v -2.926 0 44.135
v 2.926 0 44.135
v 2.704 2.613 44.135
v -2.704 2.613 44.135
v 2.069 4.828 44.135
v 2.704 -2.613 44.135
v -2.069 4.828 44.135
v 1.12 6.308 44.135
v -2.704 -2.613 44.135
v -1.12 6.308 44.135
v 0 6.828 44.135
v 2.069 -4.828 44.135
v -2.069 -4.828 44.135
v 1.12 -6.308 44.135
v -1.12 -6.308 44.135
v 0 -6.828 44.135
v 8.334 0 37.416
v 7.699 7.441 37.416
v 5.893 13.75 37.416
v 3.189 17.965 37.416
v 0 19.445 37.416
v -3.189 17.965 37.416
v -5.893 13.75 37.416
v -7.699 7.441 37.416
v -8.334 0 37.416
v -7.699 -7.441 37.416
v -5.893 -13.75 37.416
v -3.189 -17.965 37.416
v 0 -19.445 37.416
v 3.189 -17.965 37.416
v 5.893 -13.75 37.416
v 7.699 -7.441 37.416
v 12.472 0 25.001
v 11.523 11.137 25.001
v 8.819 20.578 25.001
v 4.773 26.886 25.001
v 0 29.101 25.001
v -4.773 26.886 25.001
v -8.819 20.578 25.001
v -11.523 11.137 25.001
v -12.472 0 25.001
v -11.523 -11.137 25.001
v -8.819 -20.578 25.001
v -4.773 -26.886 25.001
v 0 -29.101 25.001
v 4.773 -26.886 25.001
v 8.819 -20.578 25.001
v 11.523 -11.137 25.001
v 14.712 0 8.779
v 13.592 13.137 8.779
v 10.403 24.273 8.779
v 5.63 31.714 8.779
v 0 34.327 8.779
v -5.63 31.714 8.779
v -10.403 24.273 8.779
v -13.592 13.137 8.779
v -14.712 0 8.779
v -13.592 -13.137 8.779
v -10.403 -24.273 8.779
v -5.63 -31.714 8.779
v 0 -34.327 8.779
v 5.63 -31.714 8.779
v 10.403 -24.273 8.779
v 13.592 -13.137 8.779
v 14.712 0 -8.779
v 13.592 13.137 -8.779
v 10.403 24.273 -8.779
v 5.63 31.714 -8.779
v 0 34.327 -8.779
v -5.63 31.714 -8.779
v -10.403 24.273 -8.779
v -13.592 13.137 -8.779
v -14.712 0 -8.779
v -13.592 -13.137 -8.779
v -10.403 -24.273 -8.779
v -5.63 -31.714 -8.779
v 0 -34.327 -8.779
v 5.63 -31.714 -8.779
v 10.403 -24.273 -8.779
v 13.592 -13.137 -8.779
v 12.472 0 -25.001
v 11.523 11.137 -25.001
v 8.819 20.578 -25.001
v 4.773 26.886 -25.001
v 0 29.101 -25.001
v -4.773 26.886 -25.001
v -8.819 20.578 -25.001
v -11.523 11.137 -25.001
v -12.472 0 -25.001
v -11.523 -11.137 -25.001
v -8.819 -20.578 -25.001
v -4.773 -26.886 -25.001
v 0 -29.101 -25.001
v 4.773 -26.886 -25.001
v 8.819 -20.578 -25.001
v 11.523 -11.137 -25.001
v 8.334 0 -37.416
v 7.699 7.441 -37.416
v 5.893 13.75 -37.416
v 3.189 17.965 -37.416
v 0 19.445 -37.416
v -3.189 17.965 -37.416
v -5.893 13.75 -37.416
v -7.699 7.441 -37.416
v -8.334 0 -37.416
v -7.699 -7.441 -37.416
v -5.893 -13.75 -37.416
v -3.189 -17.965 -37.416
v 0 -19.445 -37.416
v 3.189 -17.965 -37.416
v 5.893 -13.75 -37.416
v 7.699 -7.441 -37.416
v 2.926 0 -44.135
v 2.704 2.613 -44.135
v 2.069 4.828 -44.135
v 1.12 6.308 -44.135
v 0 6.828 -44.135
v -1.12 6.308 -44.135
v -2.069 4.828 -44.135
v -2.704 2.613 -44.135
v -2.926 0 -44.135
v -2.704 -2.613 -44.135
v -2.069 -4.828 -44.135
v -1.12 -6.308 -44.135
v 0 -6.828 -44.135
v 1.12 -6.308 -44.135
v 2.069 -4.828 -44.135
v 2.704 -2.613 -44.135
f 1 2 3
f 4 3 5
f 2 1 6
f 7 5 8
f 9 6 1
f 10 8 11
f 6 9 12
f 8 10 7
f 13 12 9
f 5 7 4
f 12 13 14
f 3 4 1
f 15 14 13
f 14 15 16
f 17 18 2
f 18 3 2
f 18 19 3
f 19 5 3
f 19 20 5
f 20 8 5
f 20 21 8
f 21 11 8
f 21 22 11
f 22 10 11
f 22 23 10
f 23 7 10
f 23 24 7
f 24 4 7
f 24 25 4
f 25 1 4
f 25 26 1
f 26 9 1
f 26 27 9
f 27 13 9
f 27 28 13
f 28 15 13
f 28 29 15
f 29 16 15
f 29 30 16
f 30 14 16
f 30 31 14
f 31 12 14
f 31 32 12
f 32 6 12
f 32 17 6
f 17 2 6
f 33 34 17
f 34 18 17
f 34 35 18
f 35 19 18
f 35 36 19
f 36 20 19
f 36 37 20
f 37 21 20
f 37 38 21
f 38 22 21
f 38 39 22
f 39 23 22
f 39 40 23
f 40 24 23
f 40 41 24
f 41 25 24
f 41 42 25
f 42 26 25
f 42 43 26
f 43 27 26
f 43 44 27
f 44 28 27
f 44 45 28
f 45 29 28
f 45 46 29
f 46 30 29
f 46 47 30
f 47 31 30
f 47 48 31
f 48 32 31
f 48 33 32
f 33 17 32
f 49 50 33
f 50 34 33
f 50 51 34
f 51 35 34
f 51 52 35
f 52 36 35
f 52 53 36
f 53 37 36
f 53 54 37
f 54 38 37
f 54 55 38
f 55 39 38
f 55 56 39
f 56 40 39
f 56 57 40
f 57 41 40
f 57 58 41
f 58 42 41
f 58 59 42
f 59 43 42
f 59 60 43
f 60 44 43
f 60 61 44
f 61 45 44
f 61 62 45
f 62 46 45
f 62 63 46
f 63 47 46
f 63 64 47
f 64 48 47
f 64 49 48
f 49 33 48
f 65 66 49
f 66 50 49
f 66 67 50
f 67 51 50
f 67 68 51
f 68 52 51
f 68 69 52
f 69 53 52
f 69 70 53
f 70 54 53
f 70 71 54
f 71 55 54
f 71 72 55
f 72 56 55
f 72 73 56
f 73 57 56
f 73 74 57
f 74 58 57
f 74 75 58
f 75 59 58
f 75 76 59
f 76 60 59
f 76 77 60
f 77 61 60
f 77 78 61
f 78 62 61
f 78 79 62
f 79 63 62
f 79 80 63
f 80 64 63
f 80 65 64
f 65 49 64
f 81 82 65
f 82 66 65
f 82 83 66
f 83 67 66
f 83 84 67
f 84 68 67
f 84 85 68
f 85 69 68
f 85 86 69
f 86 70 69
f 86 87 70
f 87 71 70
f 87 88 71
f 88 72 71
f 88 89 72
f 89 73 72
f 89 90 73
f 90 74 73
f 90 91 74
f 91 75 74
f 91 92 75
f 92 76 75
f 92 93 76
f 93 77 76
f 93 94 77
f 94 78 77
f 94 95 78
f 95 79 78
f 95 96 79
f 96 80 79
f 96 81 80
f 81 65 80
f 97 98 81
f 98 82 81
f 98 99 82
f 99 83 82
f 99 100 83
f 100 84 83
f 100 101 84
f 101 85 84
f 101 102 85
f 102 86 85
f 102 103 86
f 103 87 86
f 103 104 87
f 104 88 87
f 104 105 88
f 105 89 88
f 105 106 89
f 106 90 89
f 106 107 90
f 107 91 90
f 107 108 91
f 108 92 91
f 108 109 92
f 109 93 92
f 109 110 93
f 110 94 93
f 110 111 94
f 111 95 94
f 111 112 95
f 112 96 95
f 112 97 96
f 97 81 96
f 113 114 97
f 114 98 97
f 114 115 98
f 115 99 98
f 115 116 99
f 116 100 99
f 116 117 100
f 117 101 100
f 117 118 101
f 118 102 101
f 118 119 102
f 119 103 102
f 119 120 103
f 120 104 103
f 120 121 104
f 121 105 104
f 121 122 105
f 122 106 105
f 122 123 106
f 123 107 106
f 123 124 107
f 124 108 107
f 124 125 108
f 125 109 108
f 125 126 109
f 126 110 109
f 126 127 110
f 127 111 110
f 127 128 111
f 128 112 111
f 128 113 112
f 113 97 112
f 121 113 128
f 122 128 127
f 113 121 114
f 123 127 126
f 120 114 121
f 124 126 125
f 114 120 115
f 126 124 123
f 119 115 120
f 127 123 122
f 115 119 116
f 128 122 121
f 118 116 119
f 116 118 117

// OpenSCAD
// Generated by SolidPython 1.0.1 on 2020-07-29 00:46:45


scale(v = [3, 7, 9]) {
	sphere(r = 5);
}
/***********************************************
*********      SolidPython code:      **********
************************************************
 
# import packages: SolidPython
from solid import *
from solid.utils import *
from itertools import chain, combinations, permutations


class Resize:

    def __init__(self, scad_file):
        self.scad_file = scad_file
        #self.scad_file = import_scad(scad_file)
        # cone/cylinder param:
        self.r1 = 0
        self.r2 = 0
        self.h = 0
        # rectangular prism param:
        self.w = 0
        self.l = 0
        # ellipse param:
        self.r = 0

    # import OpenScad code (file name corresponds to shape)


    # classify shape + parameters
    def assign(self, param1, param2, param3):
        if self.scad_file == 'cone.scad':
            self.r1 = param1
            self.r2 = param2
            self.h = param3
        elif self.scad_file == 'cylinder.scad':
            self.r1 = param1
            self.r2 = param2
            self.h = param3
        elif self.scad_file == 'rectangularPrism.scad':
            self.h = param1
            self.l = param2
            self.w = param3
        else:
            self.r = param1
            self.h = param2

    # resize parameters
    def iterate(self):
        x = range(3, 20, 2)
        i = 1
        if self.scad_file == 'cone.scad':
            tempList = list(permutations(x, 2))
            for temp in tempList:
                param1 = temp[0]
                param2 = temp[1]
                filepath = 'produced_scad_files/' + 'cone' + str(param1) + '_' + str(param2) + '_' + '.scad'
                scad_render_to_file(cylinder(h=param1, r1=param2, r2=0), filepath)

        elif self.scad_file == 'cylinder.scad':
            tempList = list(permutations(x, 3))
            for temp in tempList:
                param1 = temp[0]
                param2 = temp[1]
                filepath = 'produced_scad_files/' + 'cylinder' + str(param1) + '_' + str(param2) + '_' + '.scad'
                scad_render_to_file(cylinder(h=param1, r1=param2, r2=param2), filepath)

        elif self.scad_file == 'rectangularPrism.scad':
            tempList = list(permutations(x, 3))
            for temp in tempList:
                param1 = temp[0]
                param2 = temp[1]
                param3 = temp[2]
                filepath = 'produced_scad_files/' + 'rectangularPrism' + str(param1) + '_' + str(param2) + '_' + str(
                    param3) + '.scad'
                scad_render_to_file(cube(size=(param1, param2, param3)), filepath)

        elif self.scad_file == 'ellipse.scad':
            tempList = list(permutations(x, 4))
            for temp in tempList:
                param1 = temp[0]
                param2 = temp[1]
                param3 = temp[2]
                param4 = temp[3]
                filepath = 'produced_scad_files/' + 'ellipse' + str(param1) + '_' + str(param2) + '_' + str(param3) + '_' + str(param4) + '.scad'
                scad_render_to_file(scale([param1, param2, param3])(sphere(r=param4)), filepath)

    def render_to_scadfile(self):
        scad_render_to_file(scad, 'example.scad') 
 
************************************************/
